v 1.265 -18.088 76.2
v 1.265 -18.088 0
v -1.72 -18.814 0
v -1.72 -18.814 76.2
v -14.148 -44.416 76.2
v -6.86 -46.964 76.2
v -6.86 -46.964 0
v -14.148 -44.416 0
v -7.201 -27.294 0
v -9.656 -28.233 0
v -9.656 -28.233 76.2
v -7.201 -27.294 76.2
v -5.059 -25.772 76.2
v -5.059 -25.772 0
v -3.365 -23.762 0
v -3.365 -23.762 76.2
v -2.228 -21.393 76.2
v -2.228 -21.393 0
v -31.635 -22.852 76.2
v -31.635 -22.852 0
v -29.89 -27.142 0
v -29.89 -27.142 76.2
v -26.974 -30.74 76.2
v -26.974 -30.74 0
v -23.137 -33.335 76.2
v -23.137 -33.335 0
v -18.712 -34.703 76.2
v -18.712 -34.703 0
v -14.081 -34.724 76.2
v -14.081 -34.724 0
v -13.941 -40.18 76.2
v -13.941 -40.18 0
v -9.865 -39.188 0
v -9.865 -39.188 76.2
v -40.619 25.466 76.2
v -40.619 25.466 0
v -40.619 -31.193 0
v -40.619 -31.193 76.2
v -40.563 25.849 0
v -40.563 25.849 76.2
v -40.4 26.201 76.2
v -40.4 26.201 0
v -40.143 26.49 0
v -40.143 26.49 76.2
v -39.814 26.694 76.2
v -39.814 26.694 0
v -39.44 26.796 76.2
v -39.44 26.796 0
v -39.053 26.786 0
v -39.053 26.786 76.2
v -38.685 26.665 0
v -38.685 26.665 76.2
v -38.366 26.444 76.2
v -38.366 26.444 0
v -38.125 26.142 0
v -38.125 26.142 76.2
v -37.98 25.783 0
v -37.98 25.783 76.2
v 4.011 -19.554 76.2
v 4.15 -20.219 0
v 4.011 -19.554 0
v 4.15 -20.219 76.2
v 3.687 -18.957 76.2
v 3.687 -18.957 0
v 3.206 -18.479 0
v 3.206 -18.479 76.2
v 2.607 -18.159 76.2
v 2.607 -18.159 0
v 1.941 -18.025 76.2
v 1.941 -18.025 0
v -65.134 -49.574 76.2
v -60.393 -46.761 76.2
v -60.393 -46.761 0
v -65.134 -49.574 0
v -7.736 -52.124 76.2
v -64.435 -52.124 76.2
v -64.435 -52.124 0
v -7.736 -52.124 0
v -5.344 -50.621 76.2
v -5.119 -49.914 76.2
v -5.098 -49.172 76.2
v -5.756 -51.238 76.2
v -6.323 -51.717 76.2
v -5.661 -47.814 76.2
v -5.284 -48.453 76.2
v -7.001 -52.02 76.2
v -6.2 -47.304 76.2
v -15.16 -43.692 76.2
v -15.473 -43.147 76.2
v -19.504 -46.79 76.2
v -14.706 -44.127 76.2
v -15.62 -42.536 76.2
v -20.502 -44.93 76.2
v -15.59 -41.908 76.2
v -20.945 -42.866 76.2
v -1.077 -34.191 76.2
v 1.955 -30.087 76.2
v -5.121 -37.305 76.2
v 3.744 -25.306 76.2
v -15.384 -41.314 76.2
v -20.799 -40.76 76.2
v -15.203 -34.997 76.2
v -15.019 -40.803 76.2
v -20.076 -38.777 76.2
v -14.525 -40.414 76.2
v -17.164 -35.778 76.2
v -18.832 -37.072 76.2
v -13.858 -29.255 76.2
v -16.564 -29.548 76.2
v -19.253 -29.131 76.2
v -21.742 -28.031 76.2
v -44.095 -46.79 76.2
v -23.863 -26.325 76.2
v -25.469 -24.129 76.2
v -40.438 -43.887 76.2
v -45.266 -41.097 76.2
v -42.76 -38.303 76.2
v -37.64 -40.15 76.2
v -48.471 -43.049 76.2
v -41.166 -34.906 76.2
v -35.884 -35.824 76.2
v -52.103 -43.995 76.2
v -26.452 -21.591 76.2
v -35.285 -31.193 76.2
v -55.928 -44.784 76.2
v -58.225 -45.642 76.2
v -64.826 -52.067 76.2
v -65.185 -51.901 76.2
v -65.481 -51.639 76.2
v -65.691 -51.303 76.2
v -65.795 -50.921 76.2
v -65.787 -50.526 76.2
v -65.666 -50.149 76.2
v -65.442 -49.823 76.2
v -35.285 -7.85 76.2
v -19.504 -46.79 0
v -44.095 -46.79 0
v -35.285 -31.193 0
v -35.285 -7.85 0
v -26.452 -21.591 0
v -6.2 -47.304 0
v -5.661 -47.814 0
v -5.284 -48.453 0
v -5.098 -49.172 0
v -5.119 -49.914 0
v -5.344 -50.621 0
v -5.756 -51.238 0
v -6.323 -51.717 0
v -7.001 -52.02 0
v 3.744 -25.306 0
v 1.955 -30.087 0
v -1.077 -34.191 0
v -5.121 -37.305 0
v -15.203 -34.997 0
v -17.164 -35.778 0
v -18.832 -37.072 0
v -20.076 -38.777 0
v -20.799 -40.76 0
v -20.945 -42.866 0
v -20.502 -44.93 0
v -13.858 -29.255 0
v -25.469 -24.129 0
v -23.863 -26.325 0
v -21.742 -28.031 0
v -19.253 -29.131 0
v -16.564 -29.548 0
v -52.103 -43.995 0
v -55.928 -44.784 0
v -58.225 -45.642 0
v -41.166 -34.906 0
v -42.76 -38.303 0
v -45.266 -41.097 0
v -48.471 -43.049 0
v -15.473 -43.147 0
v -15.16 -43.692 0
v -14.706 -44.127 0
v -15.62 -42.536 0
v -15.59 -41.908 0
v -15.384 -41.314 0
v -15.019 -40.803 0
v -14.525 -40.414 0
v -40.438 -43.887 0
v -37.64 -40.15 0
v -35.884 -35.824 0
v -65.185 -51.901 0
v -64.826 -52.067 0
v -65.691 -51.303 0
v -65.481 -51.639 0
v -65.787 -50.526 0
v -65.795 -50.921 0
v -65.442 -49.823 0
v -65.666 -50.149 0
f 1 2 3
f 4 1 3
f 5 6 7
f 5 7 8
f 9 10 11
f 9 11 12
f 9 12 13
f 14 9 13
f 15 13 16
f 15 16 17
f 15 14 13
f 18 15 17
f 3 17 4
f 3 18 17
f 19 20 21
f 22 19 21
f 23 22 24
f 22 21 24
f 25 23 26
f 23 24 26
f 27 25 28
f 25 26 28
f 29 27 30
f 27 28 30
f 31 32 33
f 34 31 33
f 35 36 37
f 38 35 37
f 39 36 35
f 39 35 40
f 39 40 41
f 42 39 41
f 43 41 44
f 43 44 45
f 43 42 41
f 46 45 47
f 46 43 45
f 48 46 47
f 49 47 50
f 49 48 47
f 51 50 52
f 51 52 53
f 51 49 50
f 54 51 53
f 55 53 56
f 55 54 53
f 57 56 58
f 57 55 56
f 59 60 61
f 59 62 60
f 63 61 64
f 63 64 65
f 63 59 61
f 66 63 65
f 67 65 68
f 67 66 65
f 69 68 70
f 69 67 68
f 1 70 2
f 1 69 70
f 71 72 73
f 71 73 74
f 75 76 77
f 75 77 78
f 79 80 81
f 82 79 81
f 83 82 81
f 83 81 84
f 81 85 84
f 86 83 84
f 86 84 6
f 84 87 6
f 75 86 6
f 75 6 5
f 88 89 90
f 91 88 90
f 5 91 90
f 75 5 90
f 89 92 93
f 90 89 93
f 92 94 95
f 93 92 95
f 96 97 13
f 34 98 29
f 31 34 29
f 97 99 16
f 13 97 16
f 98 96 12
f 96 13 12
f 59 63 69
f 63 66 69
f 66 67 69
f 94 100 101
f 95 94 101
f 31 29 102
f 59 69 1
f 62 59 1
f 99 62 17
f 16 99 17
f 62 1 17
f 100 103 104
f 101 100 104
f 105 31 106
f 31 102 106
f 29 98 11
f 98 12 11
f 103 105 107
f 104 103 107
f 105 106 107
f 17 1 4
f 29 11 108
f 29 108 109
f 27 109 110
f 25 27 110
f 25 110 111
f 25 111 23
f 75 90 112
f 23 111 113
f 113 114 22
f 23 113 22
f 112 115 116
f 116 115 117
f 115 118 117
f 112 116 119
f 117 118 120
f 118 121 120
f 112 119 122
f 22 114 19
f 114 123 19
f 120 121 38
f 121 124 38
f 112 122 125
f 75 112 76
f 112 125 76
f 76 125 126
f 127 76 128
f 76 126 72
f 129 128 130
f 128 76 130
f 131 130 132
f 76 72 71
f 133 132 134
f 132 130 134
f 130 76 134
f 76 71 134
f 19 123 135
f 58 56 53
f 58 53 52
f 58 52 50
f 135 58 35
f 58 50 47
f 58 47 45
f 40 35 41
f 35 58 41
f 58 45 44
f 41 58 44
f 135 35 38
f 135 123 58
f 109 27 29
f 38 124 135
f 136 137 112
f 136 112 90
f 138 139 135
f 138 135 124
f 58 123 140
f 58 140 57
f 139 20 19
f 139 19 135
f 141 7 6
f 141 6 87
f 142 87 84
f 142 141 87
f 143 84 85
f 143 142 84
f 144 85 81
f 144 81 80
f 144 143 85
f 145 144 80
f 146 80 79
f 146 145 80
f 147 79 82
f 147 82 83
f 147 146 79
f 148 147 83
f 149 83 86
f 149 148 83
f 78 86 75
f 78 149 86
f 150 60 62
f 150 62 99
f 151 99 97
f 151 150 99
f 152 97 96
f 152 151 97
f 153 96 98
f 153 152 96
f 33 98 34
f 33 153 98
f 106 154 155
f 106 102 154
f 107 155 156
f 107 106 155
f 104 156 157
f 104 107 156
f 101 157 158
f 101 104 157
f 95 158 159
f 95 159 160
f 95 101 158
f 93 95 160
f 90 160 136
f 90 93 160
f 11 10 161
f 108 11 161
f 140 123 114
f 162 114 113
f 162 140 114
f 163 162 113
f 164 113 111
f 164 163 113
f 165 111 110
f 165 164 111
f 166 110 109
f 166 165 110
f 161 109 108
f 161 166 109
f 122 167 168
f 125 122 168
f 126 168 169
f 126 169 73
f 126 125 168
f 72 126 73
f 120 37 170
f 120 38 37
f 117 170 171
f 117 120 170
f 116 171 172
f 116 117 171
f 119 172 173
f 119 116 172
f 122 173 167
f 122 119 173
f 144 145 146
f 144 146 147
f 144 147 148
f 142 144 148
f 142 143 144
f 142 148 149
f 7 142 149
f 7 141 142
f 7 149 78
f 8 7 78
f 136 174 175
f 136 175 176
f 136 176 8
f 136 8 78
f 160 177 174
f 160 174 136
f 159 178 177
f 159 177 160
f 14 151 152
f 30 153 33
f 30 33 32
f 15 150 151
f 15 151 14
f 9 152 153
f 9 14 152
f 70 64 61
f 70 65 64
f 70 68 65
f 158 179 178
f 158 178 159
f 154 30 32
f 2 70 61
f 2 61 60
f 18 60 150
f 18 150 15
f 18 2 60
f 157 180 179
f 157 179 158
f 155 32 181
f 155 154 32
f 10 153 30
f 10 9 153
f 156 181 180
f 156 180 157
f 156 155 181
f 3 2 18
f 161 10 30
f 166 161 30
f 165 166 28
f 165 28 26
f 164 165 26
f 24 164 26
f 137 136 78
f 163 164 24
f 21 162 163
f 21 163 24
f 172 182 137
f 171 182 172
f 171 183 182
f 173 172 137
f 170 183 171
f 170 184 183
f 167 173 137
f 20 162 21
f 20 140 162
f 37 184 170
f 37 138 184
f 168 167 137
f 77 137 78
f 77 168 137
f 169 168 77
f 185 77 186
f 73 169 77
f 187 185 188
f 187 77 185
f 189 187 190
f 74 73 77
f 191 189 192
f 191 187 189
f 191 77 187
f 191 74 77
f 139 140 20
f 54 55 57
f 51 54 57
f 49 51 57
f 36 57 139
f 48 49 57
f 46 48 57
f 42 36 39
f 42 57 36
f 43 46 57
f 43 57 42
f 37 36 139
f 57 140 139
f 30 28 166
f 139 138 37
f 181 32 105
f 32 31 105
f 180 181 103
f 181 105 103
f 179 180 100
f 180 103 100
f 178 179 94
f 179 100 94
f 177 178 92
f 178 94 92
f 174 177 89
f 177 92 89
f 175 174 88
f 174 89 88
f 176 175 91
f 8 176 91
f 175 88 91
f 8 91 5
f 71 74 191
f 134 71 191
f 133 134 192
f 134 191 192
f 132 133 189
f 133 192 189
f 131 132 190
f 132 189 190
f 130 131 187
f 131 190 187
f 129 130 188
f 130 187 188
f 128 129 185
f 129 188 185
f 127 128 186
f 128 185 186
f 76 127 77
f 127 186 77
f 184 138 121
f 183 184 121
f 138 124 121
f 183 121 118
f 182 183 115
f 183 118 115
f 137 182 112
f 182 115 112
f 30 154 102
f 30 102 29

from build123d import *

# Parameters (mm, degrees)
F1_DEPTH     = 76.2
F2_DEPTH     = 15.24
F3_R         = 12.8774151417
F4_R         = 20.6186868219
F5_T1_DEPTH  = 101.180790156
F6_R         = 2.2113922374
F7_T1_DEPTH  = 154.3936506005
F8_T1_DEPTH  = 132.0243451665
F9_T1_DEPTH  = 76.2
F10_T1_DEPTH = 168.1440052245
F11_R        = 2.3364132001
F12_T        = -5.334


# Not quite as in the source:
# - a fillet or chamfer that OpenCascade refuses, or shapes differently, is made with other operations: its cross-section is extruded or revolved along the edge and cut away or added


with BuildPart() as f1:
    # F0 (on Top) → F1 (new body)
    with BuildSketch(Plane.XY):
        Polygon((-23.9872187376, -31.7199416459), (-47.0275729895, 62.9664510489), (-55.8593086898, 62.9664510489), (-55.8593086898, -44.0704375505), (-69.4310441613, -52.1240867674), (7.9028792679, -52.1240867674), (-21.2087563334, -41.9485626592), (8.002824487, -34.8404117285), (3.777547454, -17.4762585554), (-1.7201294546, -18.8140265274), (0, -25.8830520834), align=None)
    extrude(amount=F1_DEPTH)

    # F2 (cut): a face of the model
    f2_faces = [f1.faces().sort_by_distance(p)[0] for p in [
        (-55.8593086898, 9.4480067492, 38.1),
    ]]
    extrude(f2_faces, amount=-F2_DEPTH, mode=Mode.SUBTRACT)

    # F3
    f3_edges = [f1.edges().sort_by_distance(p)[0] for p in [
        (-40.619309, -44.070438, 38.1),
    ]]
    fillet(f3_edges, radius=F3_R)

    # F4
    f4_edges = [f1.edges().sort_by_distance(p)[0] for p in [
        (-55.859309, -44.070438, 38.1),
    ]]
    fillet(f4_edges, radius=F4_R)

    # F5: fillet of radius 1.3707998783 on 1 edges, made by hand

    # F5_s2 → F5_t1 (cut)
    with BuildSketch(Plane.XY.offset(-12.490395078)):
        with BuildLine():
            ThreePointArc((-65.1344391621, -49.5744239362), (-65.7568311931, -51.1159900142), (-64.4348861301, -52.1240867674))
            Line((-64.4348861301, -52.1240867674), (-69.4310441613, -52.1240867674))
            Line((-69.4310441613, -52.1240867674), (-65.1344391621, -49.5744239362))
        make_face()
    extrude(amount=F5_T1_DEPTH, mode=Mode.SUBTRACT)

    # F6
    f6_edges = [f1.edges().sort_by_distance(p)[0] for p in [
        (-21.208756, -41.948563, 38.1),
    ]]
    fillet(f6_edges, radius=F6_R)

    # F7: fillet of radius 2.6543994462 on 1 edges, made by hand

    # F7_s2 → F7_t1 (cut)
    with BuildSketch(Plane.XY.offset(-39.0968253003)):
        with BuildLine():
            ThreePointArc((-6.8600078332, -46.9639468268), (-5.1188800269, -49.913872102), (-7.7358508522, -52.1240867674))
            Line((-7.7358508522, -52.1240867674), (7.9028792679, -52.1240867674))
            Line((7.9028792679, -52.1240867674), (-6.8600078332, -46.9639468268))
        make_face()
    extrude(amount=F7_T1_DEPTH, mode=Mode.SUBTRACT)

    # F8: fillet of radius 1.3388584964 on 1 edges, made by hand

    # F8_s2 → F8_t1 (cut)
    with BuildSketch(Plane.XY.offset(-27.9121725832)):
        with BuildLine():
            ThreePointArc((-40.6193086898, 25.466247787), (-39.4398601206, 26.7955824133), (-37.979551683, 25.78279974))
            Line((-37.979551683, 25.78279974), (-40.6193086898, 36.6311168203))
            Line((-40.6193086898, 36.6311168203), (-40.6193086898, 25.466247787))
        make_face()
    extrude(amount=F8_T1_DEPTH, mode=Mode.SUBTRACT)

    # F9: fillet of radius 10.4245741623 on 2 edges, made by hand

    # F9_s2 → F9_t1 (join)
    with BuildSketch(Plane.XY):
        with BuildLine():
            ThreePointArc((-26.4519447103, -21.5909302259), (-21.7424015031, -28.031321364), (-13.8582073177, -29.2552156732))
            Line((-13.8582073177, -29.2552156732), (-23.9872187376, -31.7199416459))
            Line((-23.9872187376, -31.7199416459), (-26.4519447103, -21.5909302259))
        make_face()
        with BuildLine():
            ThreePointArc((-9.6557422738, -28.2326159037), (-4.1483336949, -24.8205098096), (-1.7201294546, -18.8140265274))
            Line((-1.7201294546, -18.8140265274), (0, -25.8830520834))
            Line((0, -25.8830520834), (-9.6557422738, -28.2326159037))
        make_face()
    extrude(amount=F9_T1_DEPTH)

    # F10: fillet of radius 18.3963073453 on 1 edges, made by hand

    # F10_s2 → F10_t1 (cut)
    with BuildSketch(Plane.XY.offset(-45.9720026122)):
        with BuildLine():
            ThreePointArc((3.777547454, -17.4762585554), (1.3625814789, -31.1006820929), (-9.8646080702, -39.1881534047))
            Line((-9.8646080702, -39.1881534047), (8.002824487, -34.8404117285))
            Line((8.002824487, -34.8404117285), (3.777547454, -17.4762585554))
        make_face()
    extrude(amount=F10_T1_DEPTH, mode=Mode.SUBTRACT)

    # F11
    f11_edges = [f1.edges().sort_by_distance(p)[0] for p in [
        (3.777547, -17.476259, 38.1),
    ]]
    fillet(f11_edges, radius=F11_R)

    # F12
    f12_openings = [f1.faces().sort_by_distance(p)[0] for p in [
        (-29.256427, -29.797459, 76.2),
        (-29.256427, -29.797459, 0),
    ]]
    offset(amount=F12_T, openings=f12_openings)


solid = f1.part
